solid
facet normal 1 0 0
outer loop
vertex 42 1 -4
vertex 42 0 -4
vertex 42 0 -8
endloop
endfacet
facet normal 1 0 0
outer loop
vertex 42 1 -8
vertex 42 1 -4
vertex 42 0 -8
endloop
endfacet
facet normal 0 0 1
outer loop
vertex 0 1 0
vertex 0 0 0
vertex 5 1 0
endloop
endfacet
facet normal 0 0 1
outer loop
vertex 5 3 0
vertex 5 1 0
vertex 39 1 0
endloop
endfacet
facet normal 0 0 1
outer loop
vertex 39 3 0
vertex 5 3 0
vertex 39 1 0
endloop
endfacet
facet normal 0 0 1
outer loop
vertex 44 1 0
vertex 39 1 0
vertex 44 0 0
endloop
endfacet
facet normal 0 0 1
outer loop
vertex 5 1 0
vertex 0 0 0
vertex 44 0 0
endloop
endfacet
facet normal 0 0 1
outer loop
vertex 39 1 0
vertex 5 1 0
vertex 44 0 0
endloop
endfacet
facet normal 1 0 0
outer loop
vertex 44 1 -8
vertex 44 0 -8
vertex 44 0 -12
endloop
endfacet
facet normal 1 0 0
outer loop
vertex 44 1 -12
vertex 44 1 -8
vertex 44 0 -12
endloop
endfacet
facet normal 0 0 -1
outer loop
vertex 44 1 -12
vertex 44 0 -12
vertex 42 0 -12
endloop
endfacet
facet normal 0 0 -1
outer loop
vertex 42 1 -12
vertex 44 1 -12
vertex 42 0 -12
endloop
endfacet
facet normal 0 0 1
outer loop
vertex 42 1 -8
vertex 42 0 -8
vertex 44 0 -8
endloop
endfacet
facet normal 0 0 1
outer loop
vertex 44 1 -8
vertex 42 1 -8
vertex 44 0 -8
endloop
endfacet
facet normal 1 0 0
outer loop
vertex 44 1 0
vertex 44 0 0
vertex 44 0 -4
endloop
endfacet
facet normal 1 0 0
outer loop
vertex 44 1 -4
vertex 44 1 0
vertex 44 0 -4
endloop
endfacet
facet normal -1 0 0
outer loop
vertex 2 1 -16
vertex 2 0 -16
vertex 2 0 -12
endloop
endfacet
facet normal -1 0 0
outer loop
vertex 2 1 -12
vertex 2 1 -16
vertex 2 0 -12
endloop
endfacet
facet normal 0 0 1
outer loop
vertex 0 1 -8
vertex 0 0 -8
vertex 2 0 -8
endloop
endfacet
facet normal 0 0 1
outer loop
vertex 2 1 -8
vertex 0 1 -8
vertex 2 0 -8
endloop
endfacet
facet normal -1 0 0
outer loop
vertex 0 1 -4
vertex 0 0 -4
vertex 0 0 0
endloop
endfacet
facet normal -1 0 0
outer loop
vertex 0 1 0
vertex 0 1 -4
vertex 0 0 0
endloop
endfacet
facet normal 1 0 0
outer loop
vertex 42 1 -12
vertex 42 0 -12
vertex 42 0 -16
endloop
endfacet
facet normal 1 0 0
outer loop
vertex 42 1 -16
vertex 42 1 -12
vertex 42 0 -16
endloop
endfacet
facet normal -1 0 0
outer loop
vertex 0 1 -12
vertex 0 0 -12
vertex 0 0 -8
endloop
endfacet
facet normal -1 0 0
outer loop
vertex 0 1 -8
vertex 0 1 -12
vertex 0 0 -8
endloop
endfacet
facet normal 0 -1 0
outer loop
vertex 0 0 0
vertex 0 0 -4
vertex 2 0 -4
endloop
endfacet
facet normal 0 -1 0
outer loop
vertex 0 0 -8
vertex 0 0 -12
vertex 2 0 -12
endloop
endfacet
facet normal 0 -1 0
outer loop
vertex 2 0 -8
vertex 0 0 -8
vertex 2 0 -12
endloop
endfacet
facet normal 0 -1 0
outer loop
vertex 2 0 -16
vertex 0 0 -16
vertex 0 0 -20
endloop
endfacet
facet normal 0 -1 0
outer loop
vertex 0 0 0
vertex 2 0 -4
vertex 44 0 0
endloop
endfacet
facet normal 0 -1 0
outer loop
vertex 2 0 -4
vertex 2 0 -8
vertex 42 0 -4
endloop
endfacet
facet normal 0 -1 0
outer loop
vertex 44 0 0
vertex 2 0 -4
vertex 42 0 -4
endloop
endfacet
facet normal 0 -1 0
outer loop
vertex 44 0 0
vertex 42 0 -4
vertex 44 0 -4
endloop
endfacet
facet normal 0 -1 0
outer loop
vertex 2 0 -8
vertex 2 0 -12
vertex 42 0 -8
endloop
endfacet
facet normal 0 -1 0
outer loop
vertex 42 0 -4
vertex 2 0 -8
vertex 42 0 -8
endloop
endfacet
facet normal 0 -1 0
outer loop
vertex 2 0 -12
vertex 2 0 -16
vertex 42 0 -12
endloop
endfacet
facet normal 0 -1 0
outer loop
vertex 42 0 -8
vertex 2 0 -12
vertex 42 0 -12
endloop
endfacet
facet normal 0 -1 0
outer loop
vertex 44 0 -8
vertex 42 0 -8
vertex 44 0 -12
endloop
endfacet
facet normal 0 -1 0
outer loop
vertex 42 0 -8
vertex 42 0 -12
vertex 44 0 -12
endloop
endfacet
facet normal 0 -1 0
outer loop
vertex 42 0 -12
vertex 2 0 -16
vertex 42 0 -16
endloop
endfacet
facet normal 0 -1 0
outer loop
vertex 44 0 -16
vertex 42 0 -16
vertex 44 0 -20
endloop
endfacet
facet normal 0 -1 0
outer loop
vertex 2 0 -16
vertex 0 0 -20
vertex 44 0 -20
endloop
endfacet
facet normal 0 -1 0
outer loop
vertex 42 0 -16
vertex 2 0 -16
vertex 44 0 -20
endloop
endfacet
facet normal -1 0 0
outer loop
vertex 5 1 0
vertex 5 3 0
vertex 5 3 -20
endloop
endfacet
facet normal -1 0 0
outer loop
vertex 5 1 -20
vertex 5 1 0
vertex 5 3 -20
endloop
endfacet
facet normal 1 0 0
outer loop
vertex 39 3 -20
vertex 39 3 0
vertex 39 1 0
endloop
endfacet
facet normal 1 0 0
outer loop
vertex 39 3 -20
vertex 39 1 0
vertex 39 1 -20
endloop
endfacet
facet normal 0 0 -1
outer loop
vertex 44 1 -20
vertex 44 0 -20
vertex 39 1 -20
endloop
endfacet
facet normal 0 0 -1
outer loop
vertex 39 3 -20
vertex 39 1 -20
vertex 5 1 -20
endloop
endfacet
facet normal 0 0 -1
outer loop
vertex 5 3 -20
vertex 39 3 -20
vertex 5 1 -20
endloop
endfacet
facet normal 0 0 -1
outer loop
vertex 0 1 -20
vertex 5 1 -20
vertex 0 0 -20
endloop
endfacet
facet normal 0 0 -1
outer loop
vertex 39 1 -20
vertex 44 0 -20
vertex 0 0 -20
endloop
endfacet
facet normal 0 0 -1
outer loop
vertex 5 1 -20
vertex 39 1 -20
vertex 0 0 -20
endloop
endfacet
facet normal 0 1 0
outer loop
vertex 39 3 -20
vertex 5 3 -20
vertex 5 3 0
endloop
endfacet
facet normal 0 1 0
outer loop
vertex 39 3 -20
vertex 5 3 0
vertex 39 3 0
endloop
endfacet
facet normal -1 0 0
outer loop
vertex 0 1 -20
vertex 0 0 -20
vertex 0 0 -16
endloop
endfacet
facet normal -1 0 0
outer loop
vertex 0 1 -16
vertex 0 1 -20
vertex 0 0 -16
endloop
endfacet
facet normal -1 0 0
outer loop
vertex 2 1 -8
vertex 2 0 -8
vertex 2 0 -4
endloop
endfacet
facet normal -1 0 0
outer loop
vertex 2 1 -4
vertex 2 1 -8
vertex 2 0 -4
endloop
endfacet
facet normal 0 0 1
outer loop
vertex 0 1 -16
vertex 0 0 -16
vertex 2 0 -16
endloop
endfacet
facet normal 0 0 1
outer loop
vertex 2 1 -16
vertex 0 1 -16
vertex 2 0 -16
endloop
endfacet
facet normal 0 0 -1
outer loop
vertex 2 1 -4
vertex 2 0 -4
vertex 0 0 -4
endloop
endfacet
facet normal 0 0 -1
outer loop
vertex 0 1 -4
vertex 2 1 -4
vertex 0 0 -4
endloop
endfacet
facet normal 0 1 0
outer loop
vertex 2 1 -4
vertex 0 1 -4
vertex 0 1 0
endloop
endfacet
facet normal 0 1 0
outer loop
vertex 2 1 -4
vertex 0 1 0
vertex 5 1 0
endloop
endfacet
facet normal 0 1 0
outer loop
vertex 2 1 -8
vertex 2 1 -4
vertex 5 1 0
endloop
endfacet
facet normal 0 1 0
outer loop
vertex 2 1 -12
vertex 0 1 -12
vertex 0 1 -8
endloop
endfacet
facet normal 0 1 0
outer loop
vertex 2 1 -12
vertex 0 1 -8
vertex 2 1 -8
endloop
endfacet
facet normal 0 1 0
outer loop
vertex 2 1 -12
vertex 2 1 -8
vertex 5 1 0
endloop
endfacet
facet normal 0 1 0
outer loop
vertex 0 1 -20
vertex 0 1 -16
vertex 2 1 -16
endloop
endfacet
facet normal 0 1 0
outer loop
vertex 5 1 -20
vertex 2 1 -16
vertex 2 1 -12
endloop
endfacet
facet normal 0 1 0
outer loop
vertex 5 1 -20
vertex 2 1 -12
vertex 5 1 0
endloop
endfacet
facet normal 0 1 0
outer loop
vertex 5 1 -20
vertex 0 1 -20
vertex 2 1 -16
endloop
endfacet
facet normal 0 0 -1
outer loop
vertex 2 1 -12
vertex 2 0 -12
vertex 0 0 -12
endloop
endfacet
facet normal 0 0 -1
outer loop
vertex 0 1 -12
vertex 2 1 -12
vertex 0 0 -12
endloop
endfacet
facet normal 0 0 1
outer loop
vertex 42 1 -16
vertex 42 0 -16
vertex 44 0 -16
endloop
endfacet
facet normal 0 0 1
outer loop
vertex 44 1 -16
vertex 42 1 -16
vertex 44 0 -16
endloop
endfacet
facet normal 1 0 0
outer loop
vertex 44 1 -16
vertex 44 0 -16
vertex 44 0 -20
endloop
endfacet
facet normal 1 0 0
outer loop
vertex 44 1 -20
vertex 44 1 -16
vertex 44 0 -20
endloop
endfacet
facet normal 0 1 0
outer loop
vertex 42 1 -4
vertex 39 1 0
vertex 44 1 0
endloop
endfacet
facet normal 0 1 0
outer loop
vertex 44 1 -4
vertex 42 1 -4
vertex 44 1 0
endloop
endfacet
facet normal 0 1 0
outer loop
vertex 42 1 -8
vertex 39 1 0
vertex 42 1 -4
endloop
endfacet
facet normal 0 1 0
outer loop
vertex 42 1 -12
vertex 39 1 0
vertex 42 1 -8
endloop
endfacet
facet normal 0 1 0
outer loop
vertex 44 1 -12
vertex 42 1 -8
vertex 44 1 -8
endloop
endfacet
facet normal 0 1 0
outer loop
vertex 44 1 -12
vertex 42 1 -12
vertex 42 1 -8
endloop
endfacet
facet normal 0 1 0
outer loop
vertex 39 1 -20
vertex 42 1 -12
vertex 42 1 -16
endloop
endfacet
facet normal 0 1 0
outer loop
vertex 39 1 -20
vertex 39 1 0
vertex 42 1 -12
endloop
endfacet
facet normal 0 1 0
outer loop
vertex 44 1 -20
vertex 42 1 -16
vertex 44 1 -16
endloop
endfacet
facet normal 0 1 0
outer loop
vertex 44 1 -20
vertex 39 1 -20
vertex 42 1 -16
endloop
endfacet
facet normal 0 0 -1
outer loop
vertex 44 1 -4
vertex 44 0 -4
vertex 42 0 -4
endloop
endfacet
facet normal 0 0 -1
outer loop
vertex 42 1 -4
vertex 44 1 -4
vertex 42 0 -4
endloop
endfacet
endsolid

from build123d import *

# Parameters (mm, degrees)
BOSS_EXTRUDE1_DEPTH = 3
SKETCH2_W           = 5
SKETCH2_H           = 20
CUT_EXTRUDE1_DEPTH  = 2


with BuildPart() as part:
    # Sketch1 → Boss-Extrude1 (new body)
    with BuildSketch(Plane(origin=(0, 0, 0), x_dir=(1, 0, 0), z_dir=(0, 1, 0))):
        Polygon((0, 4), (0, 0), (44, 0), (44, 4), (42, 4), (42, 8), (44, 8), (44, 12), (42, 12), (42, 16), (44, 16), (44, 20), (0, 20), (0, 16), (2, 16), (2, 12), (0, 12), (0, 8), (2, 8), (2, 4), align=None)
    extrude(amount=BOSS_EXTRUDE1_DEPTH)

    # Sketch2 → Cut-Extrude1 (cut)
    with BuildSketch(Plane(origin=(0, 3, 0), x_dir=(1, 0, 0), z_dir=(0, 1, 0))):
        with Locations((41.5, 10)):
            Rectangle(SKETCH2_W, SKETCH2_H)
        with Locations((2.5, 10)):
            Rectangle(SKETCH2_W, SKETCH2_H)
    extrude(amount=-CUT_EXTRUDE1_DEPTH, mode=Mode.SUBTRACT)


solid = part.part
